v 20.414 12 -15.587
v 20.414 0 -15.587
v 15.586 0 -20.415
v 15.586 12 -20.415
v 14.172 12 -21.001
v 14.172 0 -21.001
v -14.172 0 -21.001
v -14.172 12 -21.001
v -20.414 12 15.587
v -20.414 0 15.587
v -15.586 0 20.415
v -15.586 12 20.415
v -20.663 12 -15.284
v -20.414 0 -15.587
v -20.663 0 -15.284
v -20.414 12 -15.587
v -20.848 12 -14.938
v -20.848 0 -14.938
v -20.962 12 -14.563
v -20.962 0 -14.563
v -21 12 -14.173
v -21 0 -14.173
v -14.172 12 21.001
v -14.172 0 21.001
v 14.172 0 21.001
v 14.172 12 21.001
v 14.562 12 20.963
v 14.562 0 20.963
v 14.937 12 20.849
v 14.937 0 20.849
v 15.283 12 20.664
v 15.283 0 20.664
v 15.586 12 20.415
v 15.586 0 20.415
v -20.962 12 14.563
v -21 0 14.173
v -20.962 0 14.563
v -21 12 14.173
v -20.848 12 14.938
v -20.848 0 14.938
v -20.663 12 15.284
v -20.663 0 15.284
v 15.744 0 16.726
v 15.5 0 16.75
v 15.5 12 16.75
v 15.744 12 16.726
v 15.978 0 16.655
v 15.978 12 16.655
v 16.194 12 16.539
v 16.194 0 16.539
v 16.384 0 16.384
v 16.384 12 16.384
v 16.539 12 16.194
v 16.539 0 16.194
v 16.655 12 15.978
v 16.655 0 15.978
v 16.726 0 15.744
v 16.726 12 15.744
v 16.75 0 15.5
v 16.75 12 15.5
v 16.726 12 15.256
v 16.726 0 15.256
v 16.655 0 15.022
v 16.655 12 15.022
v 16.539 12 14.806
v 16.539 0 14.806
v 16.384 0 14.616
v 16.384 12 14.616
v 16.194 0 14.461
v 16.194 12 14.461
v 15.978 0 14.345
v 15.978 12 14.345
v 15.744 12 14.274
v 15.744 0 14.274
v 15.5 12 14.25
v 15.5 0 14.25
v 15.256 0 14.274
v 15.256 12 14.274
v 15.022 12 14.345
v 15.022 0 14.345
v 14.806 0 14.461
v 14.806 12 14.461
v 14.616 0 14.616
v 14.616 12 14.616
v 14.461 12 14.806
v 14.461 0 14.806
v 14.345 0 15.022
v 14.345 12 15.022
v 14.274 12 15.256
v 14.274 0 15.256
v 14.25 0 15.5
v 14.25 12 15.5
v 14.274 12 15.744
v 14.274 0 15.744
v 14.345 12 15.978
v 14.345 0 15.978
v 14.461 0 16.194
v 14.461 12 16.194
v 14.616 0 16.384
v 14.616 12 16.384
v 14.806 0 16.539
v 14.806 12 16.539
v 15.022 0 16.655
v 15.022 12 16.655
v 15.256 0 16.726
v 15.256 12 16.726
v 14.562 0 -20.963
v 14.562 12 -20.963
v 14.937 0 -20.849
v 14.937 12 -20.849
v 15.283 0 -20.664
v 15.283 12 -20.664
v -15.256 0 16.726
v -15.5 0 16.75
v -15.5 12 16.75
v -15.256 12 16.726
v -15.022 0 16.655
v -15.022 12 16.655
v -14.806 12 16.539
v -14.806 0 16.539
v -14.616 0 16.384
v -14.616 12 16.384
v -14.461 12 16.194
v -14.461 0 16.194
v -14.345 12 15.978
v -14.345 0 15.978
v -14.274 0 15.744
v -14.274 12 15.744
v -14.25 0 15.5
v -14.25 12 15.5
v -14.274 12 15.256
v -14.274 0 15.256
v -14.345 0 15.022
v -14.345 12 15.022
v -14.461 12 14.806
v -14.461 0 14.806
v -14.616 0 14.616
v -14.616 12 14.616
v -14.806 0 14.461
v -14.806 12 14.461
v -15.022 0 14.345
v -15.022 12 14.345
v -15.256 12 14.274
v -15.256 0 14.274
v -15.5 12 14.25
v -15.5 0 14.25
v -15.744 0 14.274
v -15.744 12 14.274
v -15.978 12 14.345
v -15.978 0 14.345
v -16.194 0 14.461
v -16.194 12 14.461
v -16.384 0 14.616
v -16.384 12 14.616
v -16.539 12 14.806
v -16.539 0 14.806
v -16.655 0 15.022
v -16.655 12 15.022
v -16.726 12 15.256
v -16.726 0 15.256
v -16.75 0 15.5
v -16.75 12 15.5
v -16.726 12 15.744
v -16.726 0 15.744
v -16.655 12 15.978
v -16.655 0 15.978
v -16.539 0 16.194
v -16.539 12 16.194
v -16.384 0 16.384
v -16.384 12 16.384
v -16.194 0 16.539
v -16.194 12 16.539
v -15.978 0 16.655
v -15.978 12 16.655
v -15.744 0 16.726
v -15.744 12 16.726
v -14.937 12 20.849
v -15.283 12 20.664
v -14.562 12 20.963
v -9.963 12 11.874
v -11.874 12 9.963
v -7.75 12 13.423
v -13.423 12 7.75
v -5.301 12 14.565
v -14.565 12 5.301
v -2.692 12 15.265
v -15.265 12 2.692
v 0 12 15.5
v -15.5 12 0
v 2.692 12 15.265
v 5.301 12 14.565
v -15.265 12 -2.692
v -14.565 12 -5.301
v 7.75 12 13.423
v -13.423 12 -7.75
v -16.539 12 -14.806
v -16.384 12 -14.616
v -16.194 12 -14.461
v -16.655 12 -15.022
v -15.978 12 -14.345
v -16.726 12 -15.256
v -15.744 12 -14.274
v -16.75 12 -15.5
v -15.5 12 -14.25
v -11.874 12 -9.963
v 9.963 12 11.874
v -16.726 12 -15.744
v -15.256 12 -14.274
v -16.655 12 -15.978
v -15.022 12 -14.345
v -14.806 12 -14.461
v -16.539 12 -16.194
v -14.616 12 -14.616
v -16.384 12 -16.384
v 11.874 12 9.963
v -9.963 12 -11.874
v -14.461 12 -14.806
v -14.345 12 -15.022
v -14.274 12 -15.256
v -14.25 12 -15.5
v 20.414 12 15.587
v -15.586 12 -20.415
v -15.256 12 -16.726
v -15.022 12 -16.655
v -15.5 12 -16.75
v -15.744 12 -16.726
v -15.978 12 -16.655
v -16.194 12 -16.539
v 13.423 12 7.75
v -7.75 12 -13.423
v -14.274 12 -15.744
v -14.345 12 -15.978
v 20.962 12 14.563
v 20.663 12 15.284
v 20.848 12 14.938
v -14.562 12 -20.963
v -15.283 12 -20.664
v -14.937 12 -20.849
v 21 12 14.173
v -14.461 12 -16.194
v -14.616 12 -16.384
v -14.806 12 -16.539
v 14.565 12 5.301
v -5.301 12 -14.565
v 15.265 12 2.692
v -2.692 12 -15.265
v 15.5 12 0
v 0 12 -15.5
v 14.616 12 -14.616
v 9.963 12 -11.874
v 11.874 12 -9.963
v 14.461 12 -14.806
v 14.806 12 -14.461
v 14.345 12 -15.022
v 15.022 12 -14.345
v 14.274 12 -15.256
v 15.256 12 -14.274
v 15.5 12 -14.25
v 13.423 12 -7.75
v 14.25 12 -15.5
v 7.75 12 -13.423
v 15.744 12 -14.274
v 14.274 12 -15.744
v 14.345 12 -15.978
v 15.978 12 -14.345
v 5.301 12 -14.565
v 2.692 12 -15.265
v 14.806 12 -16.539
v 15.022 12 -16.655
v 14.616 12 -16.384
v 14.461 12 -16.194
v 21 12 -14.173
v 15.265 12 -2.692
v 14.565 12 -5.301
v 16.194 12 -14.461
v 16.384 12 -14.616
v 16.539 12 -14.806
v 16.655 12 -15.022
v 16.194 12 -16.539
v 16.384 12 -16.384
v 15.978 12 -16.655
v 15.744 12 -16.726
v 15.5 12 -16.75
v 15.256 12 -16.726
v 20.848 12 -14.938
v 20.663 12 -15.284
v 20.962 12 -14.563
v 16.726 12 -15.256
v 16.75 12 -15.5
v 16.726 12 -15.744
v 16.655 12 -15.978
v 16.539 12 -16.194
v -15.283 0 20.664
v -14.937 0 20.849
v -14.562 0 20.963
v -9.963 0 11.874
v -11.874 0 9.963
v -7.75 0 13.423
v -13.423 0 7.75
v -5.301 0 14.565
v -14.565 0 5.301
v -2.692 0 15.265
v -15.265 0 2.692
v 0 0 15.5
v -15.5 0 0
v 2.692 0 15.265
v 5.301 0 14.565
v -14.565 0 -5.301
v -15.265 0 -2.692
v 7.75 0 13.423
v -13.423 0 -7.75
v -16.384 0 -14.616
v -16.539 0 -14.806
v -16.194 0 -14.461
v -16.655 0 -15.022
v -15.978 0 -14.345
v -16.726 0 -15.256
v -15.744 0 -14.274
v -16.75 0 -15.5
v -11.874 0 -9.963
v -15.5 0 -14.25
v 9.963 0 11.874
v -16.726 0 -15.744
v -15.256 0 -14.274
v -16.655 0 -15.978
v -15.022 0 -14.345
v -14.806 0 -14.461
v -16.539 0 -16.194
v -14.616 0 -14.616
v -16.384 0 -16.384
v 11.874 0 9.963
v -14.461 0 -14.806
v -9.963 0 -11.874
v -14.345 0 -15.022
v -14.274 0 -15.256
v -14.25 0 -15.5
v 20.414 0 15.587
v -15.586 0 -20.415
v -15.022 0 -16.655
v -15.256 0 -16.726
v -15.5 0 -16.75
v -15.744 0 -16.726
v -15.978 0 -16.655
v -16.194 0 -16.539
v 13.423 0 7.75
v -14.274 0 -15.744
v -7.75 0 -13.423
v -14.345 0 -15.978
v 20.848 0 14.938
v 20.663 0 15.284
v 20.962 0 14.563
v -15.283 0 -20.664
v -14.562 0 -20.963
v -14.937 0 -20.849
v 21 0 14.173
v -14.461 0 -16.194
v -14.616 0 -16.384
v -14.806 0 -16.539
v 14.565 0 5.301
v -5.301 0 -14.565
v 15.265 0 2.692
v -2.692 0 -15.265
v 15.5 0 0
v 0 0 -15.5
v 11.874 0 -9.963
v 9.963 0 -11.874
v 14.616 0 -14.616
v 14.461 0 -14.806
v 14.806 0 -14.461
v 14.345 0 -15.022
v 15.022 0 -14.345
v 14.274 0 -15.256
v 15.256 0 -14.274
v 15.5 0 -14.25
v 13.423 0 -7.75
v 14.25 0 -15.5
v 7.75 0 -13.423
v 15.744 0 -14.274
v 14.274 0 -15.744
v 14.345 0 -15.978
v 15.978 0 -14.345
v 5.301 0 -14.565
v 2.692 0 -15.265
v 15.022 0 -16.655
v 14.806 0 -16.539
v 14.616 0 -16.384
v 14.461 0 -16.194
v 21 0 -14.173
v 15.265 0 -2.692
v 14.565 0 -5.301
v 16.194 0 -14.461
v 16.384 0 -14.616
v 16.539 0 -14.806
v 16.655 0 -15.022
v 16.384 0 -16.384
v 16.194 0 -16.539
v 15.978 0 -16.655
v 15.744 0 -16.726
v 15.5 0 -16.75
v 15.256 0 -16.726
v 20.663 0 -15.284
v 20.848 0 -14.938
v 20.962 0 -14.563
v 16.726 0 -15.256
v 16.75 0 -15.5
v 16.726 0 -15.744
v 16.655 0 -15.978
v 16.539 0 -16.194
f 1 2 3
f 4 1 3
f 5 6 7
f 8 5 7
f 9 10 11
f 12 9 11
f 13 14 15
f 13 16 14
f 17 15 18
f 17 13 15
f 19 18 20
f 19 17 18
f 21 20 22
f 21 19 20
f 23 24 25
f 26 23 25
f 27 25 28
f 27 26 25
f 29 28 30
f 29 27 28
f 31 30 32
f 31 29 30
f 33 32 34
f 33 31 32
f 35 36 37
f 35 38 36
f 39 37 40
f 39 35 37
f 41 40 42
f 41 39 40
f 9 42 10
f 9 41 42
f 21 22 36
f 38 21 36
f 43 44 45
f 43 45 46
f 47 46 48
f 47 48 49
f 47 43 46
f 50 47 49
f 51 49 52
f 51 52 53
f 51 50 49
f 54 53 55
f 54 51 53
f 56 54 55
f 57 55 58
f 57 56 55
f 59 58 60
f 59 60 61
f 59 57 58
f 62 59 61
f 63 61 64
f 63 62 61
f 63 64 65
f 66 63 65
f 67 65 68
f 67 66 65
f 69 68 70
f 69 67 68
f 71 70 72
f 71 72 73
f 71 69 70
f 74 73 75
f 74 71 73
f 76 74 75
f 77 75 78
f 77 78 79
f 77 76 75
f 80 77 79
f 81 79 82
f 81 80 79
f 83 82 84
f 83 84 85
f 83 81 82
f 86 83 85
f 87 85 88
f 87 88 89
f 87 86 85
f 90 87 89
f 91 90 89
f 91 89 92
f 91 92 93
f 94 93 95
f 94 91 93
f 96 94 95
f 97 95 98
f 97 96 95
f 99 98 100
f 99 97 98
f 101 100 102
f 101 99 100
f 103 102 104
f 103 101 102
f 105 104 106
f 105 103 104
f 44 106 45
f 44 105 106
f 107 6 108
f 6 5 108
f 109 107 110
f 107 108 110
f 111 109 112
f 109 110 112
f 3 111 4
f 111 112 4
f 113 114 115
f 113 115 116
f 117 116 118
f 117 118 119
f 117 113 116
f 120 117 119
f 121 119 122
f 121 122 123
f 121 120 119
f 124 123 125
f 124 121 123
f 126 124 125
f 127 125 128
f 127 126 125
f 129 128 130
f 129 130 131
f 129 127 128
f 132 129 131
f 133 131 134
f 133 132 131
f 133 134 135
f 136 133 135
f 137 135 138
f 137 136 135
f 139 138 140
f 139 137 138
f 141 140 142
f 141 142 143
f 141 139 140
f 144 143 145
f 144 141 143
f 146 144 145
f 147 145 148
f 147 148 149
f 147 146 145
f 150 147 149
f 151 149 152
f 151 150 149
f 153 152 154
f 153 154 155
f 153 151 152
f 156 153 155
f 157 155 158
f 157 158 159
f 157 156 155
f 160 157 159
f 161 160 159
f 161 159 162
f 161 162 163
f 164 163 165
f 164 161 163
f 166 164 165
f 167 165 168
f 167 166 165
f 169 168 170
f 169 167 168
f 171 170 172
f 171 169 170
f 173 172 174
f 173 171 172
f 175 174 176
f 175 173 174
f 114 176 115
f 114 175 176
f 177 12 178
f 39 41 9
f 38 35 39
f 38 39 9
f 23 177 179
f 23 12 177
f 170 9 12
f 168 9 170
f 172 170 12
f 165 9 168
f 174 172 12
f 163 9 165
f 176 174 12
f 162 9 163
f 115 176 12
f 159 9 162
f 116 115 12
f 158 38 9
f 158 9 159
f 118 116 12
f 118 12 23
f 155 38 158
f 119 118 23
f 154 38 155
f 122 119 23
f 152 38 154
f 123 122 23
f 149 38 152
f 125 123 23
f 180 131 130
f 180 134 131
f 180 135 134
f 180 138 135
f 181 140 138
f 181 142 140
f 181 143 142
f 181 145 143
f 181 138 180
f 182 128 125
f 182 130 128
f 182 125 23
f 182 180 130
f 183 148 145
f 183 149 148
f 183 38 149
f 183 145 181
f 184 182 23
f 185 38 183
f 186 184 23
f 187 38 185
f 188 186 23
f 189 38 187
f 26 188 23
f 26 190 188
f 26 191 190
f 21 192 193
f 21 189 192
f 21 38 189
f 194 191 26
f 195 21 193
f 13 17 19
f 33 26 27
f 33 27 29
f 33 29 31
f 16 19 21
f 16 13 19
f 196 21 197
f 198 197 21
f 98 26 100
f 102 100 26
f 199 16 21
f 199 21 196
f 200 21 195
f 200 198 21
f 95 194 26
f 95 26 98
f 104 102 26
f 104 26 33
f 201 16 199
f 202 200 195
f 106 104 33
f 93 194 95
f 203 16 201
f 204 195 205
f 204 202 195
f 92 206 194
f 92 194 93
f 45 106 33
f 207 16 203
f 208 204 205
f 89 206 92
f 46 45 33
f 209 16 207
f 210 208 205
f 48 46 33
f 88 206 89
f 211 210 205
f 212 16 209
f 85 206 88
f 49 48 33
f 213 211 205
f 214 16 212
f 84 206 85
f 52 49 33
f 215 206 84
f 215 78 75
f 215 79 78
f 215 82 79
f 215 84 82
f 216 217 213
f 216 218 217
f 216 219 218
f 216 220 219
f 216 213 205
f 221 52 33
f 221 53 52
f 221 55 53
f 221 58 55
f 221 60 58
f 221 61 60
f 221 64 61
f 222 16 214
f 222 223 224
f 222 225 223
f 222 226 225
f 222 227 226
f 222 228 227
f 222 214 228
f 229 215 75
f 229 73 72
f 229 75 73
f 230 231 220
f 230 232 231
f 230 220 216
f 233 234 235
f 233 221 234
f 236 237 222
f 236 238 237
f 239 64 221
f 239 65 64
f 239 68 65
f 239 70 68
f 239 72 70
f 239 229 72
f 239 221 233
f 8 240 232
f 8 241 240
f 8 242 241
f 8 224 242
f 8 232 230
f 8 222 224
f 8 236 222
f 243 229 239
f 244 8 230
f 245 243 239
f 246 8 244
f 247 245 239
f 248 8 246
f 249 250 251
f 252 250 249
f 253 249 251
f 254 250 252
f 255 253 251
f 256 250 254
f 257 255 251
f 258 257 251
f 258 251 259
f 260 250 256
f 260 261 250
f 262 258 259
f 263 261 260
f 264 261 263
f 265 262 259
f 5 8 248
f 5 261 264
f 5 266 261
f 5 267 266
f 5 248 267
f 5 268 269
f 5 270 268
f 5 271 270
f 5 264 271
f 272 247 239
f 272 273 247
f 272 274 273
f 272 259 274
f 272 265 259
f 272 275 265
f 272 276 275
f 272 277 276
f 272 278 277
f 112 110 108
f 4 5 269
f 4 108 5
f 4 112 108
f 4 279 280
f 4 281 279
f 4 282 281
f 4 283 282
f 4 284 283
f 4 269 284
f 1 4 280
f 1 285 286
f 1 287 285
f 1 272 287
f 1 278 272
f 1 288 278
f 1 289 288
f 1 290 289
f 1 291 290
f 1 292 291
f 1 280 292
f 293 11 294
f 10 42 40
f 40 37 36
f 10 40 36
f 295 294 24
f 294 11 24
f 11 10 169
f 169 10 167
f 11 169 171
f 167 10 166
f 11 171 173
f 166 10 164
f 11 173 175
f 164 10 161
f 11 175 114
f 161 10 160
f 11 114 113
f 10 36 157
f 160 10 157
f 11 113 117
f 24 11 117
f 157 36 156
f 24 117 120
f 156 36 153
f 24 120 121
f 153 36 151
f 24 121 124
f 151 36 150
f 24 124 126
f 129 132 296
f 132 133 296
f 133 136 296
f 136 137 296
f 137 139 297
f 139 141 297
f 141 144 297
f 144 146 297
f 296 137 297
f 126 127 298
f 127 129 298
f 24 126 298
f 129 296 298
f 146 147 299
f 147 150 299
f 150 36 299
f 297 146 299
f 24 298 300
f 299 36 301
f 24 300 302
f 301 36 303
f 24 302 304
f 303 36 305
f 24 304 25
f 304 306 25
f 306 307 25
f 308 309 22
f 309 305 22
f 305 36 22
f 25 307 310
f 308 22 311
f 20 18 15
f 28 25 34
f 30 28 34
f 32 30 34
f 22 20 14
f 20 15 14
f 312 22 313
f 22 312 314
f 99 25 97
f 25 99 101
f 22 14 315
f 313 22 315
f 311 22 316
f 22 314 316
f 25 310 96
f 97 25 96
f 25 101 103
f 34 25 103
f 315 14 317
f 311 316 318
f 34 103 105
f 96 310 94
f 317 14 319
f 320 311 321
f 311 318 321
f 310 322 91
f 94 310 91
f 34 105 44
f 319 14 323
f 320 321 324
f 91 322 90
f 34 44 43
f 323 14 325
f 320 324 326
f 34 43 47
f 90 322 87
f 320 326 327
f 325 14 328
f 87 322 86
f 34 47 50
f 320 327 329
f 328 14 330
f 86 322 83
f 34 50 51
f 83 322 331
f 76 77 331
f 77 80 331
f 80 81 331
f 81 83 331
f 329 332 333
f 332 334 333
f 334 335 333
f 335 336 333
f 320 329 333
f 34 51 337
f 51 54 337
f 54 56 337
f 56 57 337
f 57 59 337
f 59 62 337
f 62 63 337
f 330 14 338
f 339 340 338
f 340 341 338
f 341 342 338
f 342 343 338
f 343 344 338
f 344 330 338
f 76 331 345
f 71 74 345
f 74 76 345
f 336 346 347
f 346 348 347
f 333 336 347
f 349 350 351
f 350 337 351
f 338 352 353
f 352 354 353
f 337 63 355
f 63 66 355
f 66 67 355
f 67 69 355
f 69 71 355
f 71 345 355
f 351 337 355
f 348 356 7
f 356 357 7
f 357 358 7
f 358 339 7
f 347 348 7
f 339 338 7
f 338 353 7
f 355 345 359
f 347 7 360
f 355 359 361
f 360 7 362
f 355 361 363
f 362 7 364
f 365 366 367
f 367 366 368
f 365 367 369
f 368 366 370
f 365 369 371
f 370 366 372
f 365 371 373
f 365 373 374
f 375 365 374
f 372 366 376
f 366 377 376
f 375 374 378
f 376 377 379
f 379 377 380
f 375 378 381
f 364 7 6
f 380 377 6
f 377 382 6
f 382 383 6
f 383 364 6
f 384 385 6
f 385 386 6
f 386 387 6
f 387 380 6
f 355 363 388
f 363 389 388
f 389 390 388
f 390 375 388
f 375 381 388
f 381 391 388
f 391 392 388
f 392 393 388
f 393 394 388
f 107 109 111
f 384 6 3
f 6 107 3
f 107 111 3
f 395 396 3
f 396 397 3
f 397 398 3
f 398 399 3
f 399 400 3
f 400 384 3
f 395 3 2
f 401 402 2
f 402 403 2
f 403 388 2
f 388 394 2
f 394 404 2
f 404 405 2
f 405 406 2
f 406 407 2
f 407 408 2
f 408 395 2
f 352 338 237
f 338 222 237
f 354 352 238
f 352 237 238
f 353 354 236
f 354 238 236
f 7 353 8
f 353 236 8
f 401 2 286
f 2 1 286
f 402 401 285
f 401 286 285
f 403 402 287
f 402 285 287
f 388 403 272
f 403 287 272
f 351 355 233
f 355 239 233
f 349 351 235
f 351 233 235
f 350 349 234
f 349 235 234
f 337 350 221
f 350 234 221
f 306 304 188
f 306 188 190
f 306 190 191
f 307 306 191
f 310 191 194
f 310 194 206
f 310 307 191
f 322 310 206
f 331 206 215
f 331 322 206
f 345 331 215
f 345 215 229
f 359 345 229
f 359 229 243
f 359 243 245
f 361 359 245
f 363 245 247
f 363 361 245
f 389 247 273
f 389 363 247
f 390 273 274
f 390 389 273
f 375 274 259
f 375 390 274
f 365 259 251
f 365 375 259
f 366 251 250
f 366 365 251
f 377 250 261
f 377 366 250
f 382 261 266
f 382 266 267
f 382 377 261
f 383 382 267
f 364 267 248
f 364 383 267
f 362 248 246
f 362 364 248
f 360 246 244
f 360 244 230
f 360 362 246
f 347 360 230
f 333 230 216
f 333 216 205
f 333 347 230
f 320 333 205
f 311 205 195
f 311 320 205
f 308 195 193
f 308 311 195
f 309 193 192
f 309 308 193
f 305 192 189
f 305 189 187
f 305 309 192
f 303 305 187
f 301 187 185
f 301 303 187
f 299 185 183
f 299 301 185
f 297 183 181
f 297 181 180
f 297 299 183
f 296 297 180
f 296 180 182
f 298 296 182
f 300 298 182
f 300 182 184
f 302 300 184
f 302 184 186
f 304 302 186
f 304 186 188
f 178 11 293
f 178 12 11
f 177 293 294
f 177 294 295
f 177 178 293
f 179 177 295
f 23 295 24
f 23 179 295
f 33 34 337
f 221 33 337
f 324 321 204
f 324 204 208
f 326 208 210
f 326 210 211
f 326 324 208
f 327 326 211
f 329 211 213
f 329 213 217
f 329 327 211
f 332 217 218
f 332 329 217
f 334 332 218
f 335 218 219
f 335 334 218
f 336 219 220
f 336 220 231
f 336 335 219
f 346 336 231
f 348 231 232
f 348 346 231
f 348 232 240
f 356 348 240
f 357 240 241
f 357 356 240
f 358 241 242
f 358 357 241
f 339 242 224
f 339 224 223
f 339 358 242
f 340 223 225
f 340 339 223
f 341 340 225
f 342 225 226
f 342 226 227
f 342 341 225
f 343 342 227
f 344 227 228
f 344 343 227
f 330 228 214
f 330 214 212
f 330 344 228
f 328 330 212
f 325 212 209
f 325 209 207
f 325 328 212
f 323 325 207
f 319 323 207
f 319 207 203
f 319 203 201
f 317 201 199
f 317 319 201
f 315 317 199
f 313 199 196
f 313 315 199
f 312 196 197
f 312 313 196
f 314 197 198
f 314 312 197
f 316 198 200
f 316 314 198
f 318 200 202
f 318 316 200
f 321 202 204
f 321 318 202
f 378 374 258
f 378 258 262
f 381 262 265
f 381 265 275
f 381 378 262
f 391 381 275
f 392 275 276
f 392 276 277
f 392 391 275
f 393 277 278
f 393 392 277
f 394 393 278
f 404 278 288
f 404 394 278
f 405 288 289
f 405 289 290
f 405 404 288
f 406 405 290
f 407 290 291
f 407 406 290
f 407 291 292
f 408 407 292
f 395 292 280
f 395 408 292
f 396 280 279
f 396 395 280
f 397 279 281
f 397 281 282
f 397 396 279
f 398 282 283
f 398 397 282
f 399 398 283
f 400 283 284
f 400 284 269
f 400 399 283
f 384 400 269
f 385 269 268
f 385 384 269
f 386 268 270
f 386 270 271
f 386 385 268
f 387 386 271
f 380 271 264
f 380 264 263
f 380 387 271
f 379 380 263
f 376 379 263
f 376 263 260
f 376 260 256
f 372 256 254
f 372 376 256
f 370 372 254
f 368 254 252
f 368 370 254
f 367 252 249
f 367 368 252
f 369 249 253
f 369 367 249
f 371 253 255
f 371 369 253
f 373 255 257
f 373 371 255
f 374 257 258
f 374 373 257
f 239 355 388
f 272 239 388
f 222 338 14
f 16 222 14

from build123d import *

# Parameters (mm, degrees)
SKETCH1_R           = 15.5
SKETCH1_R_2         = 1.25
BOSS_EXTRUDE2_DEPTH = 12
FILLET1_R           = 2


with BuildPart() as part:
    # Sketch1 → Boss-Extrude2 (new body)
    with BuildSketch(Plane(origin=(0, 0, 0), x_dir=(1, 0, 0), z_dir=(0, 1, 0))):
        Polygon((-15, 21.000989792), (-21, 15.000989792), (-21, -15.000989792), (-15, -21.000989792), (15, -21.000989792), (21, -15.000989792), (21, 15.000989792), (15, 21.000989792), align=None)
        with Locations(Location((0, 0, 0), (0, 0, 270))):
            Circle(SKETCH1_R, mode=Mode.SUBTRACT)
        with Locations(Location((-15.5, 15.5, 0), (0, 0, 270))):
            Circle(SKETCH1_R_2, mode=Mode.SUBTRACT)
        with Locations(Location((15.5, 15.5, 0), (0, 0, 270))):
            Circle(SKETCH1_R_2, mode=Mode.SUBTRACT)
        with Locations(Location((-15.5, -15.5, 0), (0, 0, 270))):
            Circle(SKETCH1_R_2, mode=Mode.SUBTRACT)
        with Locations(Location((15.5, -15.5, 0), (0, 0, 270))):
            Circle(SKETCH1_R_2, mode=Mode.SUBTRACT)
    extrude(amount=BOSS_EXTRUDE2_DEPTH)

    # Fillet1
    fillet1_edges = [part.edges().sort_by_distance(p)[0] for p in [
        (15, 6, -21.000989792),
        (21, 6, -15.000989792),
        (21, 6, 15.000989792),
        (15, 6, 21.000989792),
        (-15, 6, 21.000989792),
        (-21, 6, 15.000989792),
        (-21, 6, -15.000989792),
        (-15, 6, -21.000989792),
    ]]
    fillet(fillet1_edges, radius=FILLET1_R)


solid = part.part
